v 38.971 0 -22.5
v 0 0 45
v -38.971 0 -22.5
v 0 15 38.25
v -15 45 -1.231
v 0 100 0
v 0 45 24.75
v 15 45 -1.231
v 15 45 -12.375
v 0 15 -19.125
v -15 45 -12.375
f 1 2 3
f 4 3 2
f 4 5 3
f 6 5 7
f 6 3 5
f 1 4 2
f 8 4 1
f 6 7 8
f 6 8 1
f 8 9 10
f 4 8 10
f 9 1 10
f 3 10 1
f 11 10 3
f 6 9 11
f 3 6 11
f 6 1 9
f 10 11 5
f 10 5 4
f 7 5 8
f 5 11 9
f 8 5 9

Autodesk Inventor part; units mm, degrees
ref_plane "YZ Plane" through (0, 0, 0) normal (1, 0, 0) x (0, 1, 0)
ref_plane "XY Plane" through (0, 0, 0) normal (0, 0, 1) x (1, 0, 0)
sketch "Эскиз1" plane through (0, 0, 0) normal (0, 1, 0) x (-1, 0, 0)
  line L0 (0, 45) -> (38.9711, -22.5)
  line L1 (38.9711, -22.5) -> (-38.9711, -22.5)
  line L2 (-38.9711, -22.5) -> (0, 45)
  point P0 (0, 0)
  point P1 (0, 0)
ref_plane "РабПлоскость2" through (0, 100, 0) normal (0, 1, 0) x (-1, 0, 0)
ref_plane "РабПлоскость1" through (0, 0, 0) normal (0, 1, 0) x (-1, 0, 0)
sketch "Эскиз2" plane through (0, 100, 0) normal (0, 1, 0) x (-1, 0, 0)
  point P0 (0, 0)
  point P1 (0, 0)
loft "Лофт1" add profiles "Эскиз1" section 2 point at (0, 100, 0)
sketch "Эскиз3" plane through (0, 0, 0) normal (0, 0, 1) x (1, 0, 0)
  point P0 (0, 0)
sketch "Эскиз4" plane through (0, 0, 0) normal (0, 0, 1) x (1, 0, 0)
  line L0 (0, 45) -> (15, 45)
  line L1 (15, 45) -> (-15, 45)
  line L2 (-15, 45) -> (0, 15)
  line L3 (15, 45) -> (0, 15)
  point P0 (0, 0)
extrude "Выдавливание1" cut sketch "Эскиз4" along normal through all both and the other way through all
properties part number "Задача №2"
